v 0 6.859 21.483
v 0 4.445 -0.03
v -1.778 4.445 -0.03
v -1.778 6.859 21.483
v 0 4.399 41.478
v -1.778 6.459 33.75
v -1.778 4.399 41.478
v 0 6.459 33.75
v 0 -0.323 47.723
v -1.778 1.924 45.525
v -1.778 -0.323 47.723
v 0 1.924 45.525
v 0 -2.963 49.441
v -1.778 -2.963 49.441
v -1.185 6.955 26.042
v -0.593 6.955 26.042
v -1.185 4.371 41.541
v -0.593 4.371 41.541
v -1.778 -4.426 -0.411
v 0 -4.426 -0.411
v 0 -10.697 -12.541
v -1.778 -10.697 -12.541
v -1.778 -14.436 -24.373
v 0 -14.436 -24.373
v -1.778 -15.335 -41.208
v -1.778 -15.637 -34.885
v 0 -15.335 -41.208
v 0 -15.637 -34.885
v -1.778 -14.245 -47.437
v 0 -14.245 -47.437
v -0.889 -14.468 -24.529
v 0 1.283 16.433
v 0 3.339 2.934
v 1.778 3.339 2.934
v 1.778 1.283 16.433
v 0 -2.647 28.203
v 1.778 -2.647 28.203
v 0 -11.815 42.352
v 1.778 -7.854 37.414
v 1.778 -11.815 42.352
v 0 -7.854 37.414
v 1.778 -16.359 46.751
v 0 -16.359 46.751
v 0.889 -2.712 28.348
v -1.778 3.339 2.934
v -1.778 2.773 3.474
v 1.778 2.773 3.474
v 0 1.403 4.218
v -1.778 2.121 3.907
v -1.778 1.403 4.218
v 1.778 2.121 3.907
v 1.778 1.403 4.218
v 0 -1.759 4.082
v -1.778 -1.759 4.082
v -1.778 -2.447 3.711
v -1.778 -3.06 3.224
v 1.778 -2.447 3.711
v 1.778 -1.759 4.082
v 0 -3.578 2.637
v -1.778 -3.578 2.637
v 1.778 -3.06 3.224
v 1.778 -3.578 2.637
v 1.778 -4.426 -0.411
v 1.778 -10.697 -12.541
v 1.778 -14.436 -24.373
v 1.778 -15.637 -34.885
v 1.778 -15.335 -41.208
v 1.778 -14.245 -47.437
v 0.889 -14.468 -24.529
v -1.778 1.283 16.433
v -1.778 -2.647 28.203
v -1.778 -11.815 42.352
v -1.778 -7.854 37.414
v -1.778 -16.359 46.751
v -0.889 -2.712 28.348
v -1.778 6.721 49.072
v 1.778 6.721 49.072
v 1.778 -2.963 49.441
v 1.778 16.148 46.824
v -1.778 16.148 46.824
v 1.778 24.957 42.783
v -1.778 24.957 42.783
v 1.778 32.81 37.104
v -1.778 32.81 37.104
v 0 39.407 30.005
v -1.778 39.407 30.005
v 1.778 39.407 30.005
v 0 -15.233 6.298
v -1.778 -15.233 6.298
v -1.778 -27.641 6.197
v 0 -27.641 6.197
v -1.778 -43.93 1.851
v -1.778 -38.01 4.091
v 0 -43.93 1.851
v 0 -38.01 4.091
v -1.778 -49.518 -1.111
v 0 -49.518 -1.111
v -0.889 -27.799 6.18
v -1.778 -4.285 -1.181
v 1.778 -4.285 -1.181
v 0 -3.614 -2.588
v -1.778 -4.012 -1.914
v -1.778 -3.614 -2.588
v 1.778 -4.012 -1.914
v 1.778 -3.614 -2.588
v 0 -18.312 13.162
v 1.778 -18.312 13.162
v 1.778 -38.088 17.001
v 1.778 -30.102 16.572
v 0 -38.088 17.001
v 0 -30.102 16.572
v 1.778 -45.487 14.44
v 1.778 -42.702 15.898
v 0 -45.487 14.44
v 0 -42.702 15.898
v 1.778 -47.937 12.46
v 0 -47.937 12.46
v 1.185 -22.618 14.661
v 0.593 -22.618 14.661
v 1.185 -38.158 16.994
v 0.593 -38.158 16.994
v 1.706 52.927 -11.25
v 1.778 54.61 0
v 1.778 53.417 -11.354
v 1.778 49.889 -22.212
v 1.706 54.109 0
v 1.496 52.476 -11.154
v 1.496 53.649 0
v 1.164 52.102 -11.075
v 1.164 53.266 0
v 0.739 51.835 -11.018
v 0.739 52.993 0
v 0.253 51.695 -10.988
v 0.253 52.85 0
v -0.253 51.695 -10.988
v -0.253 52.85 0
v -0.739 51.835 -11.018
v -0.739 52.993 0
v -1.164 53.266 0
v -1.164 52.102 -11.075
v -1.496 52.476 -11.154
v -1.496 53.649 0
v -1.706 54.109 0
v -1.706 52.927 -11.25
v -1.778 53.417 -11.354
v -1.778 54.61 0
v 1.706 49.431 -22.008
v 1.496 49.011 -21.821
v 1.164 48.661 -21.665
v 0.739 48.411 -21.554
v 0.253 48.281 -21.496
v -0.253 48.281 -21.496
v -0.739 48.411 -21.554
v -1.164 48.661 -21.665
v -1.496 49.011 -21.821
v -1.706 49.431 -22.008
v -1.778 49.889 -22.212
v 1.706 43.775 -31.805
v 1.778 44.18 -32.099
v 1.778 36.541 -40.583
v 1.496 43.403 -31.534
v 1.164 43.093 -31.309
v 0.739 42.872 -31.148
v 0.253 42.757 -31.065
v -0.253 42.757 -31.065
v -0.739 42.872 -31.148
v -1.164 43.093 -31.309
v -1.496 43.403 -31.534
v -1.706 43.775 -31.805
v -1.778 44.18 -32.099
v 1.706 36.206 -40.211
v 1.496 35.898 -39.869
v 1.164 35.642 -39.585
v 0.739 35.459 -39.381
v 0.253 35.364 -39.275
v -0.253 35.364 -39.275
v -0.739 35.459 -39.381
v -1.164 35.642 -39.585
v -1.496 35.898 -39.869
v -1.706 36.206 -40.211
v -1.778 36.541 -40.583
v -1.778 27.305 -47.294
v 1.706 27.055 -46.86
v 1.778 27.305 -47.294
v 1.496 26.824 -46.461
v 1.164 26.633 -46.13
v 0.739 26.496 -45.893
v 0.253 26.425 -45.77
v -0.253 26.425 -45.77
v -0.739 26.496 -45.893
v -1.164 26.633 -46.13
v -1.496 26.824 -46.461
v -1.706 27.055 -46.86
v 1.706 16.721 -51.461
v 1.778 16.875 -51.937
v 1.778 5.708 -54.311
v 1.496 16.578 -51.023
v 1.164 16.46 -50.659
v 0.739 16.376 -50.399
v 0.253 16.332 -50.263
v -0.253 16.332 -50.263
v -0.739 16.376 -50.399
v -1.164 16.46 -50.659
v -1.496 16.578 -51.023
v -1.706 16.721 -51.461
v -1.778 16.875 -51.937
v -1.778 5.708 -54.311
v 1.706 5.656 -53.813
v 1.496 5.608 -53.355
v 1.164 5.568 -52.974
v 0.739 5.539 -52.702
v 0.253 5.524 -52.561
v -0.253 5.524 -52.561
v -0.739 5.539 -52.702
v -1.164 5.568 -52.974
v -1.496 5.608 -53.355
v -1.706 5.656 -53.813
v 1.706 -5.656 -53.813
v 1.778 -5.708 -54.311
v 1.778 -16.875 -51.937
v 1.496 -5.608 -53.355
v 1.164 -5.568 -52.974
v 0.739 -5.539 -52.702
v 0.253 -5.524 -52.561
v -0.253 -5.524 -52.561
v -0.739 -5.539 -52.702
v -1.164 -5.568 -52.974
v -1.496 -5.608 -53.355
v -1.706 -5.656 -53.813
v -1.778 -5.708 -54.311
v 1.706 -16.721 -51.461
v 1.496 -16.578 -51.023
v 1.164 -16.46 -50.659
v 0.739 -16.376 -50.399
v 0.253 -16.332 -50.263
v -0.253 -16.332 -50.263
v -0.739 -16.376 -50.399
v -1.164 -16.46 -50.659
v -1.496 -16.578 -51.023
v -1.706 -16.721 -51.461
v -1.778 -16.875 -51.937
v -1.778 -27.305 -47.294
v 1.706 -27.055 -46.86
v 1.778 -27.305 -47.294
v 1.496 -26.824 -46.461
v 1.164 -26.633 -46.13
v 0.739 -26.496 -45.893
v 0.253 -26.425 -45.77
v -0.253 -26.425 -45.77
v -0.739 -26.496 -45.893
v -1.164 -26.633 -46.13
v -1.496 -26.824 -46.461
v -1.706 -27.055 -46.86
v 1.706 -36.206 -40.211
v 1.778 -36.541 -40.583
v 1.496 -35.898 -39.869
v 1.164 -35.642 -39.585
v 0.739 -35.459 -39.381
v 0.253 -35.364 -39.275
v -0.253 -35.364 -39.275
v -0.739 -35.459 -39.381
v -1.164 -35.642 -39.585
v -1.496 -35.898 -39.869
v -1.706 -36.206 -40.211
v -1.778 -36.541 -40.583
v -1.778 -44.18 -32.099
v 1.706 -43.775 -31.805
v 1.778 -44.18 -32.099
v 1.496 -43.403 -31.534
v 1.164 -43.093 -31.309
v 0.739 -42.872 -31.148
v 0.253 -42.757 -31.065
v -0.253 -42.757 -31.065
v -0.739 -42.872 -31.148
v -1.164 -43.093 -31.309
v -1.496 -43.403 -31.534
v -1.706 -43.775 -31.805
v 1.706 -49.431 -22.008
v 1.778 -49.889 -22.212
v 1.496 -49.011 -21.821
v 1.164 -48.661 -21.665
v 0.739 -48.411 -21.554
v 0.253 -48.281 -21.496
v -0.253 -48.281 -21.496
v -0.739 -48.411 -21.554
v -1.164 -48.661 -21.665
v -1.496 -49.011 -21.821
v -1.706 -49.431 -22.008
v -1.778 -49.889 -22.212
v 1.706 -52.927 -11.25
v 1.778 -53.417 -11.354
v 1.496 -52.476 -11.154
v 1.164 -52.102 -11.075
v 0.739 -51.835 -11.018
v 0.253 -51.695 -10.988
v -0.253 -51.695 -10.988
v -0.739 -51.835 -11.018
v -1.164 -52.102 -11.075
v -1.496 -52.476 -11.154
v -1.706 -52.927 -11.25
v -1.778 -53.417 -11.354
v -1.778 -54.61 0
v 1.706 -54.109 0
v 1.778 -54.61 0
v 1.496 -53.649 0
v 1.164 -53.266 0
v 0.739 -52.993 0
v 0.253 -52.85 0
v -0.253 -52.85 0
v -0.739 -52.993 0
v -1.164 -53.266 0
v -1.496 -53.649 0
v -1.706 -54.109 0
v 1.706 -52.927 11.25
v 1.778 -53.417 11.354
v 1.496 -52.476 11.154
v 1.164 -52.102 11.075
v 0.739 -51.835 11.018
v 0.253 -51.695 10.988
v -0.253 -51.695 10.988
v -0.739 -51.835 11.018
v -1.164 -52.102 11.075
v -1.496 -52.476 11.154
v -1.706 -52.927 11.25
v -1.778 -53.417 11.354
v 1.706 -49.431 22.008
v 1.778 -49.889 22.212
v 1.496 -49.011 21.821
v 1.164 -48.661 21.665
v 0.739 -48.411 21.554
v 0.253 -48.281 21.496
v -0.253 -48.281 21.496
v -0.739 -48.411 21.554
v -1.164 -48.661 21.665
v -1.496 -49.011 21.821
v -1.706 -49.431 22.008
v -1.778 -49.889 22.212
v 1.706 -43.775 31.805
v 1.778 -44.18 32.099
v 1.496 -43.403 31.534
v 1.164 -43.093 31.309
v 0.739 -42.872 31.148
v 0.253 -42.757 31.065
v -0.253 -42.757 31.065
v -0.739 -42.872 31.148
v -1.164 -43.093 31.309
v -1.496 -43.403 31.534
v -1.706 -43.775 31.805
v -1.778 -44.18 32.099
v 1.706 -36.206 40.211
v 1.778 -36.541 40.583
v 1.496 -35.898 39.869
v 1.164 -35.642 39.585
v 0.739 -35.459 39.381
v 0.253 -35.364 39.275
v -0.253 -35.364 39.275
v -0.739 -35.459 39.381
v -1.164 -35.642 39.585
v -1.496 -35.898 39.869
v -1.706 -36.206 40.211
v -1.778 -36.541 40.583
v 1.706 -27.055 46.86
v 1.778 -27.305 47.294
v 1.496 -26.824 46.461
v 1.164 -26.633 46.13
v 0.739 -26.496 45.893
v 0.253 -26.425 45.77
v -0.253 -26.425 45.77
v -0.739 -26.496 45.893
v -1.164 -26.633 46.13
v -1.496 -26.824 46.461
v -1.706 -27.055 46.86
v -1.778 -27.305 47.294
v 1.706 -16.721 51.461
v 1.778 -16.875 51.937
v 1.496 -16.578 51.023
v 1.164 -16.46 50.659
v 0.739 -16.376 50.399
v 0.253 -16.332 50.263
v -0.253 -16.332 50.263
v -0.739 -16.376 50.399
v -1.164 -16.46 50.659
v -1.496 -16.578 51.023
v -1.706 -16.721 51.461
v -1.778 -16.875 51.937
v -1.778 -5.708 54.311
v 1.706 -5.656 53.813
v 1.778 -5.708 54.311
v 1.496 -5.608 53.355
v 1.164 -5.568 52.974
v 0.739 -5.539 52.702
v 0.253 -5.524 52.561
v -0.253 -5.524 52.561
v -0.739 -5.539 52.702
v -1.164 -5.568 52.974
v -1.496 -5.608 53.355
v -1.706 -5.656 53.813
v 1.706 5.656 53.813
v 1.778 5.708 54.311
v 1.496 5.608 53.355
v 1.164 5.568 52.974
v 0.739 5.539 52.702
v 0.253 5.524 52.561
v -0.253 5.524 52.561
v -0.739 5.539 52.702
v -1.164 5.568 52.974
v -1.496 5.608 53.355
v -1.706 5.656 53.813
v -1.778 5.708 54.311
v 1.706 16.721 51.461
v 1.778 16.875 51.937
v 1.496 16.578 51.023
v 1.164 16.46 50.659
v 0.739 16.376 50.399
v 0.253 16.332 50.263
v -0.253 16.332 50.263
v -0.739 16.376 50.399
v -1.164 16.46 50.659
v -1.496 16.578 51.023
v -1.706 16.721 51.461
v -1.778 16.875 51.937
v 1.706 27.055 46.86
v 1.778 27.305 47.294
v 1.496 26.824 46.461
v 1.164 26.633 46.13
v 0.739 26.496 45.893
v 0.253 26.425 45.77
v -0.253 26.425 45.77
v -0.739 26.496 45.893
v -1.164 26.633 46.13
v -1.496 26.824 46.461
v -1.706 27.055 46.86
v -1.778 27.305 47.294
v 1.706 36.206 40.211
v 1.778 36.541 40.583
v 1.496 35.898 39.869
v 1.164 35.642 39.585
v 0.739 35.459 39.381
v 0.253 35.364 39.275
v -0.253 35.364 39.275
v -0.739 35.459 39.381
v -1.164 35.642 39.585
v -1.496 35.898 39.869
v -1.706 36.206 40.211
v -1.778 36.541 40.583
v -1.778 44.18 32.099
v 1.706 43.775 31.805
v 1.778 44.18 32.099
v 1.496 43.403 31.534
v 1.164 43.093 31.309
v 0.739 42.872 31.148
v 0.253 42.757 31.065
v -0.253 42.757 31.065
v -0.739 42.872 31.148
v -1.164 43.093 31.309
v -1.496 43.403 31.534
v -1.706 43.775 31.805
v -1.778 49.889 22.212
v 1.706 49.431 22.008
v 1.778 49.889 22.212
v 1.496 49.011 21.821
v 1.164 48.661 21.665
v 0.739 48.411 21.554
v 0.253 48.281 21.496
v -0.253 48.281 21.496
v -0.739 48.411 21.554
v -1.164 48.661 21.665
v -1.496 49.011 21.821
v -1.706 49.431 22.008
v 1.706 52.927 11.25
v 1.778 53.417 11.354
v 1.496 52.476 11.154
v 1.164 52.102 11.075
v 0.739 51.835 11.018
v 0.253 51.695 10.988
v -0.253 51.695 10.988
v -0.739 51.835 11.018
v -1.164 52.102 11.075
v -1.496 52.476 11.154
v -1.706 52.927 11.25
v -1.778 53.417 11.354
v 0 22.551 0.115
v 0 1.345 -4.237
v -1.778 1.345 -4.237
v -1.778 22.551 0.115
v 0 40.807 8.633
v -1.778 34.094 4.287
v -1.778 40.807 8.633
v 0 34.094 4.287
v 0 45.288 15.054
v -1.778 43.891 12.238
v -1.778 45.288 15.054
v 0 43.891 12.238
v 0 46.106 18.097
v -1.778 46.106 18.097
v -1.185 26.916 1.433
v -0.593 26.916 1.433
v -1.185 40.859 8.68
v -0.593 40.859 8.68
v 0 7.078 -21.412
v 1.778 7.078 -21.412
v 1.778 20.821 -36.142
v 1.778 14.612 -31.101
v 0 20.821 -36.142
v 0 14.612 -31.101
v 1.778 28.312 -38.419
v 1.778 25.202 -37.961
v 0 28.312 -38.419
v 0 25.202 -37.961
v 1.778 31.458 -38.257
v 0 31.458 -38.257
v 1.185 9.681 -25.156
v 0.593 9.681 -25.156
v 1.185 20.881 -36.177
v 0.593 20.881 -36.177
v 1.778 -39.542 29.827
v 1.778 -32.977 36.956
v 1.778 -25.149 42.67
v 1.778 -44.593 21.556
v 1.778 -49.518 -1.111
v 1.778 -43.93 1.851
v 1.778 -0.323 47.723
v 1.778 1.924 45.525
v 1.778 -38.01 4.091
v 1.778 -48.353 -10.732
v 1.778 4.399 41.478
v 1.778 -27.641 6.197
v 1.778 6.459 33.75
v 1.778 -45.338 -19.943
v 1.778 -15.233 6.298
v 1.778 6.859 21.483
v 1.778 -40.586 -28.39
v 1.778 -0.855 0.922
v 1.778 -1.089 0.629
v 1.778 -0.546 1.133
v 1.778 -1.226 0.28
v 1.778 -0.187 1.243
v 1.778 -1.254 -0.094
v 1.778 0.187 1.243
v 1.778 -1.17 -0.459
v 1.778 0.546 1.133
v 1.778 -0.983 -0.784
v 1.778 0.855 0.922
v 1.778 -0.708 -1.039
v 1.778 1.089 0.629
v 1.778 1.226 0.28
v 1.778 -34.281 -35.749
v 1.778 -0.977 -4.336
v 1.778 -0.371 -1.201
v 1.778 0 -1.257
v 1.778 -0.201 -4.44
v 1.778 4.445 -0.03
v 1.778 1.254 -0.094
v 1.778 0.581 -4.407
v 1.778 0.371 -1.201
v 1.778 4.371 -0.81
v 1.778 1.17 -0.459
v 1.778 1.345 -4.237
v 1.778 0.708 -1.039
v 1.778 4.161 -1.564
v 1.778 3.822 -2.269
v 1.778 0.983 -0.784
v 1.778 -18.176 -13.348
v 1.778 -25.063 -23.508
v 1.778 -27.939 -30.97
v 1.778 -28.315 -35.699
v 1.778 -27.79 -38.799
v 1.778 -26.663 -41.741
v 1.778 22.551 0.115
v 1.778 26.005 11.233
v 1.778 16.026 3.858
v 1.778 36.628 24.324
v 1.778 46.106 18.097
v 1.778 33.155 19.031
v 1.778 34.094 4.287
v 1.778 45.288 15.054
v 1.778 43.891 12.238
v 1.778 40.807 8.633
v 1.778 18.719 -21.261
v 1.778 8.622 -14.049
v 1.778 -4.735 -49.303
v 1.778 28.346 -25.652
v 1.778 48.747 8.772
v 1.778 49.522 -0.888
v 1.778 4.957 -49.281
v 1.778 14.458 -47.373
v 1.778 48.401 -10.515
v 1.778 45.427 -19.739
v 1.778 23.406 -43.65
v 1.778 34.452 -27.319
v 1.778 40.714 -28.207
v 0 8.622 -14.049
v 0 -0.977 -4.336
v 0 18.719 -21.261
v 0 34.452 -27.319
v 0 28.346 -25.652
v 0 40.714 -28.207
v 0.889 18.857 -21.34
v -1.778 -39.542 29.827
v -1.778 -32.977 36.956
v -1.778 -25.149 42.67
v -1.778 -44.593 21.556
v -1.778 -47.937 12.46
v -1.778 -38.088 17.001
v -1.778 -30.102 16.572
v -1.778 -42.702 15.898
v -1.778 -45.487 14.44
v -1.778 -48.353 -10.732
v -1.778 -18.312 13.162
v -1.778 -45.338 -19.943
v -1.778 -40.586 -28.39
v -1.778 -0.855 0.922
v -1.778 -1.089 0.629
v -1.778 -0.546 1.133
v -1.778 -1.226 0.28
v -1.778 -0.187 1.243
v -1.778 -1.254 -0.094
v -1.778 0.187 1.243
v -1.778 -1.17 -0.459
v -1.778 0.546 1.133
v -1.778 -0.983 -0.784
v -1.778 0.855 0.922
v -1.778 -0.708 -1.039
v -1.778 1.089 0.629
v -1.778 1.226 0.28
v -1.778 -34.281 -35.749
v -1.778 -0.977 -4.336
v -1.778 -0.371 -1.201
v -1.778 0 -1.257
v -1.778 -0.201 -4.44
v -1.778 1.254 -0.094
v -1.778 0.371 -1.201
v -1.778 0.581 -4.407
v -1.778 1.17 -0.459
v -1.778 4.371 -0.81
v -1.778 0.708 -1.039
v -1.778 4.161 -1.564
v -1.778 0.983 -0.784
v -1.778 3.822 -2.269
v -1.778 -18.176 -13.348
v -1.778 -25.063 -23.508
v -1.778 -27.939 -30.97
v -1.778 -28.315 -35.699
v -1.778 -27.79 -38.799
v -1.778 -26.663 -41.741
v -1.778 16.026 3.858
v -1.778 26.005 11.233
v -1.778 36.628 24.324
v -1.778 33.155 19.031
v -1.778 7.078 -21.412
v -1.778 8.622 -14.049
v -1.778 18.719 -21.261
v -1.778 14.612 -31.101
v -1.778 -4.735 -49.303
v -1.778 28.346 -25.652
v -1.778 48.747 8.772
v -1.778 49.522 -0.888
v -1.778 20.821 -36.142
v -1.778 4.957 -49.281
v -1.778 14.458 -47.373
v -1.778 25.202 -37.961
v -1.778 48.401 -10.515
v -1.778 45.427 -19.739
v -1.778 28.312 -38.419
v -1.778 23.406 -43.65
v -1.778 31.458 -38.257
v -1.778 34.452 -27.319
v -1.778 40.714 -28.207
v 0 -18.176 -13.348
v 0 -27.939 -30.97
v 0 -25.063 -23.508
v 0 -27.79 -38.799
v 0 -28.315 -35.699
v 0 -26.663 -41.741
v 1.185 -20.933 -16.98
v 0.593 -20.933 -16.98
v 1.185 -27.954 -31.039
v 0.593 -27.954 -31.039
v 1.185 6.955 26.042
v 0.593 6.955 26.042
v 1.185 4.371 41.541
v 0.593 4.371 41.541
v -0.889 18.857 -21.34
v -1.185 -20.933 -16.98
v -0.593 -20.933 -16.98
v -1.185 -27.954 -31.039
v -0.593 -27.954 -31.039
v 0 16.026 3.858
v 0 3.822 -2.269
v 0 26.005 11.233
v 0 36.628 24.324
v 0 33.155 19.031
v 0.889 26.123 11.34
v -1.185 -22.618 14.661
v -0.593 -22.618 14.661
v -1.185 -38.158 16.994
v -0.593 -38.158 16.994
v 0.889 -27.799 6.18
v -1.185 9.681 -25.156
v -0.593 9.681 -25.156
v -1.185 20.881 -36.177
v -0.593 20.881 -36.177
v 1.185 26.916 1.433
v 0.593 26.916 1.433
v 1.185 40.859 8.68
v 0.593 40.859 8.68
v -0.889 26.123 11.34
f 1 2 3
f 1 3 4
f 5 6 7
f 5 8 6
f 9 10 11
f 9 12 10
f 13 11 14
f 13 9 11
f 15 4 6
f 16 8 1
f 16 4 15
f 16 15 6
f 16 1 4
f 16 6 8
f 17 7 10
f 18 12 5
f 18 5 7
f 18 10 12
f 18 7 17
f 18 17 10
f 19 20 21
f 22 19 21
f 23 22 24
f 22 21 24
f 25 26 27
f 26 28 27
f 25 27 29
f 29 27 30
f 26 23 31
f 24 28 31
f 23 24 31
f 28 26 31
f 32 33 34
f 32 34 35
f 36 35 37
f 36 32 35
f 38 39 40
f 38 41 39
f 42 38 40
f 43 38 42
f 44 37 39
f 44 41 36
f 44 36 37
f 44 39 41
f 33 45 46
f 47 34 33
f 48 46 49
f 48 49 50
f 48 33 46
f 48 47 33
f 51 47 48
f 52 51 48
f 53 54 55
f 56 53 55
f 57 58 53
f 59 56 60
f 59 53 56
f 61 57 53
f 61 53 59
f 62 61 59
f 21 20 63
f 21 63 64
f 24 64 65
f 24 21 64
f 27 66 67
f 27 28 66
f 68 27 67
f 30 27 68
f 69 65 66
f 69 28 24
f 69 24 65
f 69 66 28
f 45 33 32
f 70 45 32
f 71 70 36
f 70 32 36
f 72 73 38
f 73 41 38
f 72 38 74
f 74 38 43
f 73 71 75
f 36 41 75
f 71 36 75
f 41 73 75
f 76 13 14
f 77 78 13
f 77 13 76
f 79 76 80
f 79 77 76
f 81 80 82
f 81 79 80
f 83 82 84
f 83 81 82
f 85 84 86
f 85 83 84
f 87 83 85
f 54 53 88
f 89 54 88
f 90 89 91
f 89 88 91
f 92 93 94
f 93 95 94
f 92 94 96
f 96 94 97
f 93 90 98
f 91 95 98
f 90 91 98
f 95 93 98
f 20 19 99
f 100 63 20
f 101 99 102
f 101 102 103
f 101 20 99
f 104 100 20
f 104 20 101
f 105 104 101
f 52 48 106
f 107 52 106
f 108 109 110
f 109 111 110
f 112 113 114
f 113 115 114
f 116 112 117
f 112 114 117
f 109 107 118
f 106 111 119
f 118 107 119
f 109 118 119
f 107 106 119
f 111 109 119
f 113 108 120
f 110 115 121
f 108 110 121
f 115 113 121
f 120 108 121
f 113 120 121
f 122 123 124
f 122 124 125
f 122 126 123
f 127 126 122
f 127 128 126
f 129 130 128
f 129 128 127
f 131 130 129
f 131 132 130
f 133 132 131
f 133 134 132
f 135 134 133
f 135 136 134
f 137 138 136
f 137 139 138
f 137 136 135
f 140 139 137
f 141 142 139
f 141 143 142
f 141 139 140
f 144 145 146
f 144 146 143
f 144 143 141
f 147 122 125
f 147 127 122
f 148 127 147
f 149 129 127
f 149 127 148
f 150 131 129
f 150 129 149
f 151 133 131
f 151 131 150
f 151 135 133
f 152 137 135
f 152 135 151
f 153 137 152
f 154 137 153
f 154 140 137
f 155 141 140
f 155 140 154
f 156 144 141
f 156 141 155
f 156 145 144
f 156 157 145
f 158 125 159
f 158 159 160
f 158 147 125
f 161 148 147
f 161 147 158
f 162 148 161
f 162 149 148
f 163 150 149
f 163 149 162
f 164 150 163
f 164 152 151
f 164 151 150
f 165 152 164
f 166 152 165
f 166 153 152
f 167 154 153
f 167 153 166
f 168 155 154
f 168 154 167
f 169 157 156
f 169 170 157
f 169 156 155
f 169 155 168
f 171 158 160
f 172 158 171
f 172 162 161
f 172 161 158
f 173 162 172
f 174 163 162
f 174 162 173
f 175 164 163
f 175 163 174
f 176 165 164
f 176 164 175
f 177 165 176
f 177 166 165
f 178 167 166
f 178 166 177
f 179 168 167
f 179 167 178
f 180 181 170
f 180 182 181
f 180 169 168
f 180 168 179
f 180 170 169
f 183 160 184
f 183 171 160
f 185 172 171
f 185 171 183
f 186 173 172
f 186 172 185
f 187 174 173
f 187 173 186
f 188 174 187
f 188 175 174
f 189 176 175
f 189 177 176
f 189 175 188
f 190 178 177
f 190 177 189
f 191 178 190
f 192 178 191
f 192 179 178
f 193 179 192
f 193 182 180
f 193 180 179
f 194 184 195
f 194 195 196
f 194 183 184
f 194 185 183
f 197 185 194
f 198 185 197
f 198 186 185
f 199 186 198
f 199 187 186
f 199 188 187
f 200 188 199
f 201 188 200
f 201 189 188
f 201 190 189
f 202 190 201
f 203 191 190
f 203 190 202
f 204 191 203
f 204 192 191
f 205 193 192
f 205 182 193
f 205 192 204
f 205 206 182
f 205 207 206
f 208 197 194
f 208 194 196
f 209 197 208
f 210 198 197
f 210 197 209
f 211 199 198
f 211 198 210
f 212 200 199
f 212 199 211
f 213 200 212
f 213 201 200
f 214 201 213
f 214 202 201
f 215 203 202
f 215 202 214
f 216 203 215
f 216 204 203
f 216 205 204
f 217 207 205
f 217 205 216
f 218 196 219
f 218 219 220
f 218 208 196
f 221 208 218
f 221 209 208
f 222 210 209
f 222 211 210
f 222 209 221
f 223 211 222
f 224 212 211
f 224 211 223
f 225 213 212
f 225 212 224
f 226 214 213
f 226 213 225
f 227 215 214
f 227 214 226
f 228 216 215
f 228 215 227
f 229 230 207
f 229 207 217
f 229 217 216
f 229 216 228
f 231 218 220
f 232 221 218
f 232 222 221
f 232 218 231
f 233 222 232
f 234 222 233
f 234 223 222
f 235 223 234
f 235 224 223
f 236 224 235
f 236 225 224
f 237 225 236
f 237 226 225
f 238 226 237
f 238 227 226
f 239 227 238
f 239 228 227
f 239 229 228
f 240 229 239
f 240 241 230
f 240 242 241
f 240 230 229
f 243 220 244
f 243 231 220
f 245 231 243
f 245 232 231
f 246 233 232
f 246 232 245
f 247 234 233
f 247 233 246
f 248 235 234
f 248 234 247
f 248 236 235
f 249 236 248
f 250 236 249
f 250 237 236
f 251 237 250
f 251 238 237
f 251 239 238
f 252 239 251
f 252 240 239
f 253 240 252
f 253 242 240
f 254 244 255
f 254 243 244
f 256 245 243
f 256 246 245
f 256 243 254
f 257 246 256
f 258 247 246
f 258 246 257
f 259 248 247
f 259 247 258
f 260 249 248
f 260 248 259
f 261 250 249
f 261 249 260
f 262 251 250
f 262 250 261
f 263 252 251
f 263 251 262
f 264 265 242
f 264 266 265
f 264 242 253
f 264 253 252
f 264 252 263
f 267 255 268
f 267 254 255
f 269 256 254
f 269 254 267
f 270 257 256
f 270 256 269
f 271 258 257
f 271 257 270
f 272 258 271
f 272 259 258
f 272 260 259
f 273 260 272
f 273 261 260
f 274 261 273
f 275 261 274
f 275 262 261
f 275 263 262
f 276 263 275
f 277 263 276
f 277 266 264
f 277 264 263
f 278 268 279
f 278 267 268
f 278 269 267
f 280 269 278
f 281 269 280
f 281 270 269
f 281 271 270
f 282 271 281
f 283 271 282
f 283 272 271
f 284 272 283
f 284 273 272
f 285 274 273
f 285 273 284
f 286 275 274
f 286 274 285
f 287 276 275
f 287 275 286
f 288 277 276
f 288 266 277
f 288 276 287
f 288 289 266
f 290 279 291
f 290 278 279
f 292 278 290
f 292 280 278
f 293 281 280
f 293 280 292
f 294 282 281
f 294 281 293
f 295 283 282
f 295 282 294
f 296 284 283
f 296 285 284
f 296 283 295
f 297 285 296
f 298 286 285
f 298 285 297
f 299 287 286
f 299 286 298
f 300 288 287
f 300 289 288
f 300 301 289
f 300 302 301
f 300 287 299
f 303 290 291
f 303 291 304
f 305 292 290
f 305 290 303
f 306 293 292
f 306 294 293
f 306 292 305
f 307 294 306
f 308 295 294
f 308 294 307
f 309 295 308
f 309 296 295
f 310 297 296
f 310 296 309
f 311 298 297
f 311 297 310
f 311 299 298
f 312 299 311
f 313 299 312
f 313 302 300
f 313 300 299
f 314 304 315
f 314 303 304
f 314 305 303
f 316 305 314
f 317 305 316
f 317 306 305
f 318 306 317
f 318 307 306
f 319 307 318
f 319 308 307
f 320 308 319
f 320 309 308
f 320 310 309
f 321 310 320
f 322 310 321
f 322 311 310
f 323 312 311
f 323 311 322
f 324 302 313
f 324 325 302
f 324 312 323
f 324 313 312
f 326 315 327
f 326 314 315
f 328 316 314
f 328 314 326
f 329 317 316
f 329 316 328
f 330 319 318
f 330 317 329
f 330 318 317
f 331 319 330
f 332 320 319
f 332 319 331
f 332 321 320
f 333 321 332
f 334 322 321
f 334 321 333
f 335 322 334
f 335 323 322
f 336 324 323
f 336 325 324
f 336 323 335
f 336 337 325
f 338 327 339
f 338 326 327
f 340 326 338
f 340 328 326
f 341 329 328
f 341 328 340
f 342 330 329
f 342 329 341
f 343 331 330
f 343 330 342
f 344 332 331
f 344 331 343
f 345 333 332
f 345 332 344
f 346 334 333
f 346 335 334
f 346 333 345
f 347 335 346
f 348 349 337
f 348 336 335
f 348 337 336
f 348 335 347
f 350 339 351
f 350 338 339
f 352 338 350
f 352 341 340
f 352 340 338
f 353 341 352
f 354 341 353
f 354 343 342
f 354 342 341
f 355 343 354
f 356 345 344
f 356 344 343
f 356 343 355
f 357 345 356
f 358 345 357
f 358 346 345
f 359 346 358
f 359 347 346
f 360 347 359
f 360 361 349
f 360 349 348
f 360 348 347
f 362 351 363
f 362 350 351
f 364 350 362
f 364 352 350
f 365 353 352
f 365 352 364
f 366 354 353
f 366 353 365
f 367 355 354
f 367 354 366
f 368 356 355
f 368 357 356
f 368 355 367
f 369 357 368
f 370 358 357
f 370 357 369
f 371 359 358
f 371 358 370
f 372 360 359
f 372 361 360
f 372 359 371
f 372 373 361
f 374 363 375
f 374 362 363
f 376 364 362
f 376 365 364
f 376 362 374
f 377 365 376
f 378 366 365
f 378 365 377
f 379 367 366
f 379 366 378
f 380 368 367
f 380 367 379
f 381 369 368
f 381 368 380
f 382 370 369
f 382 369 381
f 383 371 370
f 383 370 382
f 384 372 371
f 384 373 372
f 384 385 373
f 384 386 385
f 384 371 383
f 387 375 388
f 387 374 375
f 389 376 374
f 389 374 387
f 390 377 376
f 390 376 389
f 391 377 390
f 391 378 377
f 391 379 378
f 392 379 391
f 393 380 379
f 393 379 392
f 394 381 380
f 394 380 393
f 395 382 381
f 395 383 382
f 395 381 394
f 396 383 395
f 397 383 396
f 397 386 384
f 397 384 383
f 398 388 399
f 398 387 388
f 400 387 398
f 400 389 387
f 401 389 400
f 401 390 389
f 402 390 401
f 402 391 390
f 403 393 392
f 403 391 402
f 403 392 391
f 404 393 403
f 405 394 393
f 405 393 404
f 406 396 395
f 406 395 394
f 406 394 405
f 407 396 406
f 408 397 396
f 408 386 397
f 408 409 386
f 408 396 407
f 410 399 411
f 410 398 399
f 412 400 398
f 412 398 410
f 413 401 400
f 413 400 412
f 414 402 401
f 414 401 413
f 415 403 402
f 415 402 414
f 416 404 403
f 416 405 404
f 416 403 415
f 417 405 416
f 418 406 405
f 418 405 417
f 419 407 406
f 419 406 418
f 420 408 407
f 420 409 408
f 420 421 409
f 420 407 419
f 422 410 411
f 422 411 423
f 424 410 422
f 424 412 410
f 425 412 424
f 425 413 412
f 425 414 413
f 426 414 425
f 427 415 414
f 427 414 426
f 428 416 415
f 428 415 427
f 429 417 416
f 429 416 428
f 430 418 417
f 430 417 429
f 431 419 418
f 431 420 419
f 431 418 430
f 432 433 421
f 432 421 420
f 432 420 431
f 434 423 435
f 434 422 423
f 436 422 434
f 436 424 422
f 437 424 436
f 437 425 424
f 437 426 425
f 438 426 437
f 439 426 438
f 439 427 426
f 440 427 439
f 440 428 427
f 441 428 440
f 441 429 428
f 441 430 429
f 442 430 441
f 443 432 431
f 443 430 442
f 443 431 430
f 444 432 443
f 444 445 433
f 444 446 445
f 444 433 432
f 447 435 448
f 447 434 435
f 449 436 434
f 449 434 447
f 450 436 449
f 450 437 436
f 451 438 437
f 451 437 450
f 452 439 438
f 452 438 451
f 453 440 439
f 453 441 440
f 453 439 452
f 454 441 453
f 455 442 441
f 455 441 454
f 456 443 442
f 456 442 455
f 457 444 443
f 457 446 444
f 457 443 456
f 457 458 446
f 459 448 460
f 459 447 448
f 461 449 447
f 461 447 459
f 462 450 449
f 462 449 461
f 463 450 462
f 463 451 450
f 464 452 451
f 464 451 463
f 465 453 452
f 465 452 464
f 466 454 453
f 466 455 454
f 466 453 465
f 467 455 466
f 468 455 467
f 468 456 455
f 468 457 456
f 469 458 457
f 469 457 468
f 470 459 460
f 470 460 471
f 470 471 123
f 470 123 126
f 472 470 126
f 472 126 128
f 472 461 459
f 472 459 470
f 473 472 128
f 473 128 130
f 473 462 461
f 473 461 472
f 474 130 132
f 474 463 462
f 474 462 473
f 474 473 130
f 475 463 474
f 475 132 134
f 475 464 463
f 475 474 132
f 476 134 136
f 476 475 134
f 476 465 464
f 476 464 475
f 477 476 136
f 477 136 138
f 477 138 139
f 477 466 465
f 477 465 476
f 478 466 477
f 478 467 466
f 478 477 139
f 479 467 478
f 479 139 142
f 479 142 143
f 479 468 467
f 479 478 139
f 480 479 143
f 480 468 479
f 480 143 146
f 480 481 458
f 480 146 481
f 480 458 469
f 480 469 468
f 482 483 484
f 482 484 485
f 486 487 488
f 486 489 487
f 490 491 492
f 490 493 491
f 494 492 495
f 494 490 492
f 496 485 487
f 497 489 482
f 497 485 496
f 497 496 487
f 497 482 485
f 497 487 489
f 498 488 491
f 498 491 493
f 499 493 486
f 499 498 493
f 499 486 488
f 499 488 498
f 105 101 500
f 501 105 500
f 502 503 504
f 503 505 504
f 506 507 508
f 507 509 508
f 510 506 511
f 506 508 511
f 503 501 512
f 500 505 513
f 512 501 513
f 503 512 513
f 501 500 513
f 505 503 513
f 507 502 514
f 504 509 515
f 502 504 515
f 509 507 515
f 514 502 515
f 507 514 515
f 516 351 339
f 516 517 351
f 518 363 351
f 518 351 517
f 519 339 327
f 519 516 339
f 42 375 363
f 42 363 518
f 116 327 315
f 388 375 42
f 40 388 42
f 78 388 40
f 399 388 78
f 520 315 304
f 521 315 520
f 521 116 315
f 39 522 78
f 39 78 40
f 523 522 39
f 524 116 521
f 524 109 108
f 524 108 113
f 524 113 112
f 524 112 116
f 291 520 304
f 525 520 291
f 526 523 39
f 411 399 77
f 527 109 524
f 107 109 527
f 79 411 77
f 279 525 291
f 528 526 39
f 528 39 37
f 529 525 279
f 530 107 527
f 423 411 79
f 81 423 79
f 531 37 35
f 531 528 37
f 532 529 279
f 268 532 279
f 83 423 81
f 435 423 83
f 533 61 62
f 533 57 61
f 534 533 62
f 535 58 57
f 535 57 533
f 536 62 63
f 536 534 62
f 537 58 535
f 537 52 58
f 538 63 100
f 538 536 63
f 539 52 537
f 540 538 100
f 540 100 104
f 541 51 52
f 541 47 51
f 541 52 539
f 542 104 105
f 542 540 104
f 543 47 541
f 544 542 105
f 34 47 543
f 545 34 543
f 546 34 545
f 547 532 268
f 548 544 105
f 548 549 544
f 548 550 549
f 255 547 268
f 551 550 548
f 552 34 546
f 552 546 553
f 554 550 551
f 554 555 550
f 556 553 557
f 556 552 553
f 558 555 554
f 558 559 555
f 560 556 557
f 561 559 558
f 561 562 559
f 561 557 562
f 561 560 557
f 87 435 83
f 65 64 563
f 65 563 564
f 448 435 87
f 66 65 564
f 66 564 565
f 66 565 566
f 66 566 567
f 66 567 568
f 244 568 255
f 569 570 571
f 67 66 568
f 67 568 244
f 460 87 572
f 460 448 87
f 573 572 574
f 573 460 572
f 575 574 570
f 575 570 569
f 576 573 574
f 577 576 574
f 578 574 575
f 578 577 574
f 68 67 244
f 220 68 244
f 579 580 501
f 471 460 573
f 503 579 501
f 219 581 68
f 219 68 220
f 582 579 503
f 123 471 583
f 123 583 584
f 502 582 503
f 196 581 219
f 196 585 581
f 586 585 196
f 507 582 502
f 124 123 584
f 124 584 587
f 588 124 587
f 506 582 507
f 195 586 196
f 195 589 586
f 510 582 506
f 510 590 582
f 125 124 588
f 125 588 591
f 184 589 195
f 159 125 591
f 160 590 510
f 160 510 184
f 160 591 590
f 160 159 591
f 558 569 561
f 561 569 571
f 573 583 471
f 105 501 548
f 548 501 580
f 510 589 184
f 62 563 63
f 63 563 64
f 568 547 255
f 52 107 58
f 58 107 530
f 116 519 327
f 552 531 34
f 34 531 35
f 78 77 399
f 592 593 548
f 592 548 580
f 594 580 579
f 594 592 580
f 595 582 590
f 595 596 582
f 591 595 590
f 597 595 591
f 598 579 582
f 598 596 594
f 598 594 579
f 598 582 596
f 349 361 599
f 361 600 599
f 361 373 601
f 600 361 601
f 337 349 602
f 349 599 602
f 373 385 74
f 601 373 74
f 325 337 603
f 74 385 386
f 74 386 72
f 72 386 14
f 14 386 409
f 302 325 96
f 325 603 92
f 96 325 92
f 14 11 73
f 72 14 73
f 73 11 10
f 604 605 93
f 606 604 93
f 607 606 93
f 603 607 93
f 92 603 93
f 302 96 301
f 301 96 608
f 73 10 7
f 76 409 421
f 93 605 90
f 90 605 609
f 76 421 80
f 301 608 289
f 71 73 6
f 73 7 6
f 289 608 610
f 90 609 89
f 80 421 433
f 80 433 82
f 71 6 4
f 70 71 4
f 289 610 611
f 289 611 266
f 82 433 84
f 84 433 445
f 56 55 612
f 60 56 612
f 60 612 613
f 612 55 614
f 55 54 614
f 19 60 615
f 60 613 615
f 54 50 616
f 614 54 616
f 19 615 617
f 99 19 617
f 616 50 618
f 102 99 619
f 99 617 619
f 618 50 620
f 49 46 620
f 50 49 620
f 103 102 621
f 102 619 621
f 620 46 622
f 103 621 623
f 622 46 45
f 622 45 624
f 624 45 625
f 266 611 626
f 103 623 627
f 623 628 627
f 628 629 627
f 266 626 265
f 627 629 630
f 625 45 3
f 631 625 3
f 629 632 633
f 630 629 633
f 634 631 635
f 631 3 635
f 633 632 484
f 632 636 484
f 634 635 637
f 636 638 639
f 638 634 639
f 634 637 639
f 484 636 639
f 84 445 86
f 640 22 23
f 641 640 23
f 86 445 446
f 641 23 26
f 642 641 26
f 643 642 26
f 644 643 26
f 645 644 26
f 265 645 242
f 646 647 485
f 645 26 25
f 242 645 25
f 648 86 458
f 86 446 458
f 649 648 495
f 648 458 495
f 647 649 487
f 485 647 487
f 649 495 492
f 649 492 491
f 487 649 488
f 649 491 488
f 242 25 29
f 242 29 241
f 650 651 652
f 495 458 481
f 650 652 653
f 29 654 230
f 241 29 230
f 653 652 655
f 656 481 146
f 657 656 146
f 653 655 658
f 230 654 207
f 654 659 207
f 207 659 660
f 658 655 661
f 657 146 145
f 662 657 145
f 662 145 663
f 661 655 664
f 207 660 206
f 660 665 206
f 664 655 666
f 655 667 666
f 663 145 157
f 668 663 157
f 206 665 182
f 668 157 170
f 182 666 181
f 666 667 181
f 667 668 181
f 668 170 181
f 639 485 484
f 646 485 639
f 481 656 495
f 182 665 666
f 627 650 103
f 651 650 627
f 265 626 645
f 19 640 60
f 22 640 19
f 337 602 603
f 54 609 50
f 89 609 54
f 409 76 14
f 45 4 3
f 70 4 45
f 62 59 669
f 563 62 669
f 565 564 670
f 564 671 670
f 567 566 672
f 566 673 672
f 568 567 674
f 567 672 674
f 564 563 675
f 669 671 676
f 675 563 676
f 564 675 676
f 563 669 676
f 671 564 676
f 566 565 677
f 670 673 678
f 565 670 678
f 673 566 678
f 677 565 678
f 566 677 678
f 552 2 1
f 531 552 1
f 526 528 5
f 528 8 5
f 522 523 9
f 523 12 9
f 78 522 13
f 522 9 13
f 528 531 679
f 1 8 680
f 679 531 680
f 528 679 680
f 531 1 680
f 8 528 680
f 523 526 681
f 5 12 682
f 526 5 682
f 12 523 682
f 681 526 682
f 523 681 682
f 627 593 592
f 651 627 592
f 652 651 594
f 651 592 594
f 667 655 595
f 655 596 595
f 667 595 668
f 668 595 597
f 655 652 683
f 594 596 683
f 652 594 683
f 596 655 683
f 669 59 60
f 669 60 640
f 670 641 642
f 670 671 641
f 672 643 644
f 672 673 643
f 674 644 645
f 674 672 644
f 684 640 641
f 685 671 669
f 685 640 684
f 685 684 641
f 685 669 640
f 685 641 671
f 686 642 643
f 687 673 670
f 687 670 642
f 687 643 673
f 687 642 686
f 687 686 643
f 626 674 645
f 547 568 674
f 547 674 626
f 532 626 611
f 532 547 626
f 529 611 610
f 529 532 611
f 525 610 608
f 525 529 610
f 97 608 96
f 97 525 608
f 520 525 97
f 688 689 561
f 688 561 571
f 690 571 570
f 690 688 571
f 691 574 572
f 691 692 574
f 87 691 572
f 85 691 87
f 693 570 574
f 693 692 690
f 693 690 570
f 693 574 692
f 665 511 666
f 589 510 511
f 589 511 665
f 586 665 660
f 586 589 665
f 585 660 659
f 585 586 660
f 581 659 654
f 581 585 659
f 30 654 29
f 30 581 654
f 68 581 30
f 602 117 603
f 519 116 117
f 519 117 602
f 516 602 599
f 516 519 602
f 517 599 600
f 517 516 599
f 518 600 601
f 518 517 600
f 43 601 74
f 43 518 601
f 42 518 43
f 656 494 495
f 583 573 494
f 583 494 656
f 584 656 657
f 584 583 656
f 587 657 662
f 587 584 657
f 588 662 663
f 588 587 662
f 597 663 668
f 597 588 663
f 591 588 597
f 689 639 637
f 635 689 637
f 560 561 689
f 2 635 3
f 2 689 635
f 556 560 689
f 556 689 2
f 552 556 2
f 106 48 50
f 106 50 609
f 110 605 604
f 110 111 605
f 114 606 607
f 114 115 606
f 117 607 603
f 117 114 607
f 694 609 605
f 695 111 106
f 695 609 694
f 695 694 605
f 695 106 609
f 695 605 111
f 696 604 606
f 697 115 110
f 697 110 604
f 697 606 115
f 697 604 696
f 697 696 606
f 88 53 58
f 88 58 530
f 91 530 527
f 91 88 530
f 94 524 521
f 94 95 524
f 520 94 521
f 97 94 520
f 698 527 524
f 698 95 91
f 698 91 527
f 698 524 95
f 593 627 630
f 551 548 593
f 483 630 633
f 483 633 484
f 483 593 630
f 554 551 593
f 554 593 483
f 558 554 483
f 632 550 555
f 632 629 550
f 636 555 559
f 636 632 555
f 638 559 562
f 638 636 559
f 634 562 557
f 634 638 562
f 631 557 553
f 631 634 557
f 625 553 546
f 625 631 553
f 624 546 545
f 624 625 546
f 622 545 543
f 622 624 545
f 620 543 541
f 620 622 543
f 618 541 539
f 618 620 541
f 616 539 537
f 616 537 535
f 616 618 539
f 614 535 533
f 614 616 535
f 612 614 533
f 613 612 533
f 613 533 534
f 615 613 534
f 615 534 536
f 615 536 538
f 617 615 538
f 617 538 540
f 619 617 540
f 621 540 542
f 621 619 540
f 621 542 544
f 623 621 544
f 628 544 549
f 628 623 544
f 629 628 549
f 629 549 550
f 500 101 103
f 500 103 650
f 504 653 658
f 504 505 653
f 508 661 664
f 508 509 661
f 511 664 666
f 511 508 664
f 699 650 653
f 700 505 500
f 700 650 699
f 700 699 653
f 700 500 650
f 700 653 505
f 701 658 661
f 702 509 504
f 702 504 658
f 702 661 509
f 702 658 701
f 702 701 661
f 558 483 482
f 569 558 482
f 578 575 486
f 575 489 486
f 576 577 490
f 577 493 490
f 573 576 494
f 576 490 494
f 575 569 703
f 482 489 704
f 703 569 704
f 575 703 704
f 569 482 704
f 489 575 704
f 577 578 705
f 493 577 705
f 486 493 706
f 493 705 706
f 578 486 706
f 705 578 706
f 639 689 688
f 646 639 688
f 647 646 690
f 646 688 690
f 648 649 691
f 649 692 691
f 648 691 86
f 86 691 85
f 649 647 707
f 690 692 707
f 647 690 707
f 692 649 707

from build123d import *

# Parameters (mm, degrees)
SKETCH3_R           = 4.445
SKETCH3_R_2         = 1.2573
BOSS_EXTRUDE1_DEPTH = 1.778
BOSS_EXTRUDE2_DEPTH = 1.778
CIRPATTERN1_COUNT   = 5


with BuildPart() as part:
    # Sketch1 → Revolve1 (revolve)
    with BuildSketch(Plane.XY):
        with BuildLine():
            Line((-1.778, 49.53), (1.778, 49.53))
            Line((1.778, 49.53), (1.778, 54.61))
            ThreePointArc((1.778, 54.61), (0, 52.832), (-1.778, 54.61))
            Line((-1.778, 54.61), (-1.778, 49.53))
        make_face()
    revolve(axis=Axis((0, 0, 0), (-1, 0, 0)))



with BuildPart() as body_2:
    # Sketch3 → Boss-Extrude1 (new body, symmetric)
    with BuildSketch(Plane(origin=(0, 0, 0), x_dir=(0, 0, -1), z_dir=(1, 0, 0))):
        Circle(SKETCH3_R)
        Circle(SKETCH3_R_2, mode=Mode.SUBTRACT)
    extrude(amount=BOSS_EXTRUDE1_DEPTH, both=True)


with BuildPart() as part_1:
    add(part.part)

    add(body_2.part)  # Boss-Extrude2 merges body 2
    # Sketch4 → Boss-Extrude2 (add, symmetric)
    with BuildSketch(Plane(origin=(0, 0, 0), x_dir=(0, 0, -1), z_dir=(1, 0, 0))):
        with BuildLine():
            add(Edge.make_bspline(
                [(4.236760603, 1.34457599), (-0.842126183, 33.70804678), (-7.397626382, 44.22942933), (-18.096543838, 46.105704648)],
                knots=[0.007889083, 0.007889083, 0.007889083, 0.007889083, 0.582841342, 0.582841342, 0.582841342, 0.582841342], degree=3))
            ThreePointArc((-18.096543838, 46.105704648), (-24.282655216, 43.169127344), (-30.004622023, 39.407404853))
            add(Edge.make_bspline(
                [(2.269041799, 3.822234204), (-8.811754066, 30.630525708), (-30.004622023, 39.407404853)],
                knots=[0, 0, 0, 0.677750608, 0.677750608, 0.677750608], degree=2))
            ThreePointArc((2.269041799, 3.822234204), (3.480813667, 2.764409742), (4.236760603, 1.34457599))
        make_face()
    boss_extrude2 = extrude(amount=BOSS_EXTRUDE2_DEPTH, both=True)

    # CirPattern1: Boss-Extrude2 ×5 about axis
    cirpattern1_axis = Axis((0, 0, 0), (1, 0, 0))
    for i in range(1, CIRPATTERN1_COUNT):
        add(boss_extrude2.rotate(cirpattern1_axis, i * 360 / CIRPATTERN1_COUNT))


solid = part_1.part
